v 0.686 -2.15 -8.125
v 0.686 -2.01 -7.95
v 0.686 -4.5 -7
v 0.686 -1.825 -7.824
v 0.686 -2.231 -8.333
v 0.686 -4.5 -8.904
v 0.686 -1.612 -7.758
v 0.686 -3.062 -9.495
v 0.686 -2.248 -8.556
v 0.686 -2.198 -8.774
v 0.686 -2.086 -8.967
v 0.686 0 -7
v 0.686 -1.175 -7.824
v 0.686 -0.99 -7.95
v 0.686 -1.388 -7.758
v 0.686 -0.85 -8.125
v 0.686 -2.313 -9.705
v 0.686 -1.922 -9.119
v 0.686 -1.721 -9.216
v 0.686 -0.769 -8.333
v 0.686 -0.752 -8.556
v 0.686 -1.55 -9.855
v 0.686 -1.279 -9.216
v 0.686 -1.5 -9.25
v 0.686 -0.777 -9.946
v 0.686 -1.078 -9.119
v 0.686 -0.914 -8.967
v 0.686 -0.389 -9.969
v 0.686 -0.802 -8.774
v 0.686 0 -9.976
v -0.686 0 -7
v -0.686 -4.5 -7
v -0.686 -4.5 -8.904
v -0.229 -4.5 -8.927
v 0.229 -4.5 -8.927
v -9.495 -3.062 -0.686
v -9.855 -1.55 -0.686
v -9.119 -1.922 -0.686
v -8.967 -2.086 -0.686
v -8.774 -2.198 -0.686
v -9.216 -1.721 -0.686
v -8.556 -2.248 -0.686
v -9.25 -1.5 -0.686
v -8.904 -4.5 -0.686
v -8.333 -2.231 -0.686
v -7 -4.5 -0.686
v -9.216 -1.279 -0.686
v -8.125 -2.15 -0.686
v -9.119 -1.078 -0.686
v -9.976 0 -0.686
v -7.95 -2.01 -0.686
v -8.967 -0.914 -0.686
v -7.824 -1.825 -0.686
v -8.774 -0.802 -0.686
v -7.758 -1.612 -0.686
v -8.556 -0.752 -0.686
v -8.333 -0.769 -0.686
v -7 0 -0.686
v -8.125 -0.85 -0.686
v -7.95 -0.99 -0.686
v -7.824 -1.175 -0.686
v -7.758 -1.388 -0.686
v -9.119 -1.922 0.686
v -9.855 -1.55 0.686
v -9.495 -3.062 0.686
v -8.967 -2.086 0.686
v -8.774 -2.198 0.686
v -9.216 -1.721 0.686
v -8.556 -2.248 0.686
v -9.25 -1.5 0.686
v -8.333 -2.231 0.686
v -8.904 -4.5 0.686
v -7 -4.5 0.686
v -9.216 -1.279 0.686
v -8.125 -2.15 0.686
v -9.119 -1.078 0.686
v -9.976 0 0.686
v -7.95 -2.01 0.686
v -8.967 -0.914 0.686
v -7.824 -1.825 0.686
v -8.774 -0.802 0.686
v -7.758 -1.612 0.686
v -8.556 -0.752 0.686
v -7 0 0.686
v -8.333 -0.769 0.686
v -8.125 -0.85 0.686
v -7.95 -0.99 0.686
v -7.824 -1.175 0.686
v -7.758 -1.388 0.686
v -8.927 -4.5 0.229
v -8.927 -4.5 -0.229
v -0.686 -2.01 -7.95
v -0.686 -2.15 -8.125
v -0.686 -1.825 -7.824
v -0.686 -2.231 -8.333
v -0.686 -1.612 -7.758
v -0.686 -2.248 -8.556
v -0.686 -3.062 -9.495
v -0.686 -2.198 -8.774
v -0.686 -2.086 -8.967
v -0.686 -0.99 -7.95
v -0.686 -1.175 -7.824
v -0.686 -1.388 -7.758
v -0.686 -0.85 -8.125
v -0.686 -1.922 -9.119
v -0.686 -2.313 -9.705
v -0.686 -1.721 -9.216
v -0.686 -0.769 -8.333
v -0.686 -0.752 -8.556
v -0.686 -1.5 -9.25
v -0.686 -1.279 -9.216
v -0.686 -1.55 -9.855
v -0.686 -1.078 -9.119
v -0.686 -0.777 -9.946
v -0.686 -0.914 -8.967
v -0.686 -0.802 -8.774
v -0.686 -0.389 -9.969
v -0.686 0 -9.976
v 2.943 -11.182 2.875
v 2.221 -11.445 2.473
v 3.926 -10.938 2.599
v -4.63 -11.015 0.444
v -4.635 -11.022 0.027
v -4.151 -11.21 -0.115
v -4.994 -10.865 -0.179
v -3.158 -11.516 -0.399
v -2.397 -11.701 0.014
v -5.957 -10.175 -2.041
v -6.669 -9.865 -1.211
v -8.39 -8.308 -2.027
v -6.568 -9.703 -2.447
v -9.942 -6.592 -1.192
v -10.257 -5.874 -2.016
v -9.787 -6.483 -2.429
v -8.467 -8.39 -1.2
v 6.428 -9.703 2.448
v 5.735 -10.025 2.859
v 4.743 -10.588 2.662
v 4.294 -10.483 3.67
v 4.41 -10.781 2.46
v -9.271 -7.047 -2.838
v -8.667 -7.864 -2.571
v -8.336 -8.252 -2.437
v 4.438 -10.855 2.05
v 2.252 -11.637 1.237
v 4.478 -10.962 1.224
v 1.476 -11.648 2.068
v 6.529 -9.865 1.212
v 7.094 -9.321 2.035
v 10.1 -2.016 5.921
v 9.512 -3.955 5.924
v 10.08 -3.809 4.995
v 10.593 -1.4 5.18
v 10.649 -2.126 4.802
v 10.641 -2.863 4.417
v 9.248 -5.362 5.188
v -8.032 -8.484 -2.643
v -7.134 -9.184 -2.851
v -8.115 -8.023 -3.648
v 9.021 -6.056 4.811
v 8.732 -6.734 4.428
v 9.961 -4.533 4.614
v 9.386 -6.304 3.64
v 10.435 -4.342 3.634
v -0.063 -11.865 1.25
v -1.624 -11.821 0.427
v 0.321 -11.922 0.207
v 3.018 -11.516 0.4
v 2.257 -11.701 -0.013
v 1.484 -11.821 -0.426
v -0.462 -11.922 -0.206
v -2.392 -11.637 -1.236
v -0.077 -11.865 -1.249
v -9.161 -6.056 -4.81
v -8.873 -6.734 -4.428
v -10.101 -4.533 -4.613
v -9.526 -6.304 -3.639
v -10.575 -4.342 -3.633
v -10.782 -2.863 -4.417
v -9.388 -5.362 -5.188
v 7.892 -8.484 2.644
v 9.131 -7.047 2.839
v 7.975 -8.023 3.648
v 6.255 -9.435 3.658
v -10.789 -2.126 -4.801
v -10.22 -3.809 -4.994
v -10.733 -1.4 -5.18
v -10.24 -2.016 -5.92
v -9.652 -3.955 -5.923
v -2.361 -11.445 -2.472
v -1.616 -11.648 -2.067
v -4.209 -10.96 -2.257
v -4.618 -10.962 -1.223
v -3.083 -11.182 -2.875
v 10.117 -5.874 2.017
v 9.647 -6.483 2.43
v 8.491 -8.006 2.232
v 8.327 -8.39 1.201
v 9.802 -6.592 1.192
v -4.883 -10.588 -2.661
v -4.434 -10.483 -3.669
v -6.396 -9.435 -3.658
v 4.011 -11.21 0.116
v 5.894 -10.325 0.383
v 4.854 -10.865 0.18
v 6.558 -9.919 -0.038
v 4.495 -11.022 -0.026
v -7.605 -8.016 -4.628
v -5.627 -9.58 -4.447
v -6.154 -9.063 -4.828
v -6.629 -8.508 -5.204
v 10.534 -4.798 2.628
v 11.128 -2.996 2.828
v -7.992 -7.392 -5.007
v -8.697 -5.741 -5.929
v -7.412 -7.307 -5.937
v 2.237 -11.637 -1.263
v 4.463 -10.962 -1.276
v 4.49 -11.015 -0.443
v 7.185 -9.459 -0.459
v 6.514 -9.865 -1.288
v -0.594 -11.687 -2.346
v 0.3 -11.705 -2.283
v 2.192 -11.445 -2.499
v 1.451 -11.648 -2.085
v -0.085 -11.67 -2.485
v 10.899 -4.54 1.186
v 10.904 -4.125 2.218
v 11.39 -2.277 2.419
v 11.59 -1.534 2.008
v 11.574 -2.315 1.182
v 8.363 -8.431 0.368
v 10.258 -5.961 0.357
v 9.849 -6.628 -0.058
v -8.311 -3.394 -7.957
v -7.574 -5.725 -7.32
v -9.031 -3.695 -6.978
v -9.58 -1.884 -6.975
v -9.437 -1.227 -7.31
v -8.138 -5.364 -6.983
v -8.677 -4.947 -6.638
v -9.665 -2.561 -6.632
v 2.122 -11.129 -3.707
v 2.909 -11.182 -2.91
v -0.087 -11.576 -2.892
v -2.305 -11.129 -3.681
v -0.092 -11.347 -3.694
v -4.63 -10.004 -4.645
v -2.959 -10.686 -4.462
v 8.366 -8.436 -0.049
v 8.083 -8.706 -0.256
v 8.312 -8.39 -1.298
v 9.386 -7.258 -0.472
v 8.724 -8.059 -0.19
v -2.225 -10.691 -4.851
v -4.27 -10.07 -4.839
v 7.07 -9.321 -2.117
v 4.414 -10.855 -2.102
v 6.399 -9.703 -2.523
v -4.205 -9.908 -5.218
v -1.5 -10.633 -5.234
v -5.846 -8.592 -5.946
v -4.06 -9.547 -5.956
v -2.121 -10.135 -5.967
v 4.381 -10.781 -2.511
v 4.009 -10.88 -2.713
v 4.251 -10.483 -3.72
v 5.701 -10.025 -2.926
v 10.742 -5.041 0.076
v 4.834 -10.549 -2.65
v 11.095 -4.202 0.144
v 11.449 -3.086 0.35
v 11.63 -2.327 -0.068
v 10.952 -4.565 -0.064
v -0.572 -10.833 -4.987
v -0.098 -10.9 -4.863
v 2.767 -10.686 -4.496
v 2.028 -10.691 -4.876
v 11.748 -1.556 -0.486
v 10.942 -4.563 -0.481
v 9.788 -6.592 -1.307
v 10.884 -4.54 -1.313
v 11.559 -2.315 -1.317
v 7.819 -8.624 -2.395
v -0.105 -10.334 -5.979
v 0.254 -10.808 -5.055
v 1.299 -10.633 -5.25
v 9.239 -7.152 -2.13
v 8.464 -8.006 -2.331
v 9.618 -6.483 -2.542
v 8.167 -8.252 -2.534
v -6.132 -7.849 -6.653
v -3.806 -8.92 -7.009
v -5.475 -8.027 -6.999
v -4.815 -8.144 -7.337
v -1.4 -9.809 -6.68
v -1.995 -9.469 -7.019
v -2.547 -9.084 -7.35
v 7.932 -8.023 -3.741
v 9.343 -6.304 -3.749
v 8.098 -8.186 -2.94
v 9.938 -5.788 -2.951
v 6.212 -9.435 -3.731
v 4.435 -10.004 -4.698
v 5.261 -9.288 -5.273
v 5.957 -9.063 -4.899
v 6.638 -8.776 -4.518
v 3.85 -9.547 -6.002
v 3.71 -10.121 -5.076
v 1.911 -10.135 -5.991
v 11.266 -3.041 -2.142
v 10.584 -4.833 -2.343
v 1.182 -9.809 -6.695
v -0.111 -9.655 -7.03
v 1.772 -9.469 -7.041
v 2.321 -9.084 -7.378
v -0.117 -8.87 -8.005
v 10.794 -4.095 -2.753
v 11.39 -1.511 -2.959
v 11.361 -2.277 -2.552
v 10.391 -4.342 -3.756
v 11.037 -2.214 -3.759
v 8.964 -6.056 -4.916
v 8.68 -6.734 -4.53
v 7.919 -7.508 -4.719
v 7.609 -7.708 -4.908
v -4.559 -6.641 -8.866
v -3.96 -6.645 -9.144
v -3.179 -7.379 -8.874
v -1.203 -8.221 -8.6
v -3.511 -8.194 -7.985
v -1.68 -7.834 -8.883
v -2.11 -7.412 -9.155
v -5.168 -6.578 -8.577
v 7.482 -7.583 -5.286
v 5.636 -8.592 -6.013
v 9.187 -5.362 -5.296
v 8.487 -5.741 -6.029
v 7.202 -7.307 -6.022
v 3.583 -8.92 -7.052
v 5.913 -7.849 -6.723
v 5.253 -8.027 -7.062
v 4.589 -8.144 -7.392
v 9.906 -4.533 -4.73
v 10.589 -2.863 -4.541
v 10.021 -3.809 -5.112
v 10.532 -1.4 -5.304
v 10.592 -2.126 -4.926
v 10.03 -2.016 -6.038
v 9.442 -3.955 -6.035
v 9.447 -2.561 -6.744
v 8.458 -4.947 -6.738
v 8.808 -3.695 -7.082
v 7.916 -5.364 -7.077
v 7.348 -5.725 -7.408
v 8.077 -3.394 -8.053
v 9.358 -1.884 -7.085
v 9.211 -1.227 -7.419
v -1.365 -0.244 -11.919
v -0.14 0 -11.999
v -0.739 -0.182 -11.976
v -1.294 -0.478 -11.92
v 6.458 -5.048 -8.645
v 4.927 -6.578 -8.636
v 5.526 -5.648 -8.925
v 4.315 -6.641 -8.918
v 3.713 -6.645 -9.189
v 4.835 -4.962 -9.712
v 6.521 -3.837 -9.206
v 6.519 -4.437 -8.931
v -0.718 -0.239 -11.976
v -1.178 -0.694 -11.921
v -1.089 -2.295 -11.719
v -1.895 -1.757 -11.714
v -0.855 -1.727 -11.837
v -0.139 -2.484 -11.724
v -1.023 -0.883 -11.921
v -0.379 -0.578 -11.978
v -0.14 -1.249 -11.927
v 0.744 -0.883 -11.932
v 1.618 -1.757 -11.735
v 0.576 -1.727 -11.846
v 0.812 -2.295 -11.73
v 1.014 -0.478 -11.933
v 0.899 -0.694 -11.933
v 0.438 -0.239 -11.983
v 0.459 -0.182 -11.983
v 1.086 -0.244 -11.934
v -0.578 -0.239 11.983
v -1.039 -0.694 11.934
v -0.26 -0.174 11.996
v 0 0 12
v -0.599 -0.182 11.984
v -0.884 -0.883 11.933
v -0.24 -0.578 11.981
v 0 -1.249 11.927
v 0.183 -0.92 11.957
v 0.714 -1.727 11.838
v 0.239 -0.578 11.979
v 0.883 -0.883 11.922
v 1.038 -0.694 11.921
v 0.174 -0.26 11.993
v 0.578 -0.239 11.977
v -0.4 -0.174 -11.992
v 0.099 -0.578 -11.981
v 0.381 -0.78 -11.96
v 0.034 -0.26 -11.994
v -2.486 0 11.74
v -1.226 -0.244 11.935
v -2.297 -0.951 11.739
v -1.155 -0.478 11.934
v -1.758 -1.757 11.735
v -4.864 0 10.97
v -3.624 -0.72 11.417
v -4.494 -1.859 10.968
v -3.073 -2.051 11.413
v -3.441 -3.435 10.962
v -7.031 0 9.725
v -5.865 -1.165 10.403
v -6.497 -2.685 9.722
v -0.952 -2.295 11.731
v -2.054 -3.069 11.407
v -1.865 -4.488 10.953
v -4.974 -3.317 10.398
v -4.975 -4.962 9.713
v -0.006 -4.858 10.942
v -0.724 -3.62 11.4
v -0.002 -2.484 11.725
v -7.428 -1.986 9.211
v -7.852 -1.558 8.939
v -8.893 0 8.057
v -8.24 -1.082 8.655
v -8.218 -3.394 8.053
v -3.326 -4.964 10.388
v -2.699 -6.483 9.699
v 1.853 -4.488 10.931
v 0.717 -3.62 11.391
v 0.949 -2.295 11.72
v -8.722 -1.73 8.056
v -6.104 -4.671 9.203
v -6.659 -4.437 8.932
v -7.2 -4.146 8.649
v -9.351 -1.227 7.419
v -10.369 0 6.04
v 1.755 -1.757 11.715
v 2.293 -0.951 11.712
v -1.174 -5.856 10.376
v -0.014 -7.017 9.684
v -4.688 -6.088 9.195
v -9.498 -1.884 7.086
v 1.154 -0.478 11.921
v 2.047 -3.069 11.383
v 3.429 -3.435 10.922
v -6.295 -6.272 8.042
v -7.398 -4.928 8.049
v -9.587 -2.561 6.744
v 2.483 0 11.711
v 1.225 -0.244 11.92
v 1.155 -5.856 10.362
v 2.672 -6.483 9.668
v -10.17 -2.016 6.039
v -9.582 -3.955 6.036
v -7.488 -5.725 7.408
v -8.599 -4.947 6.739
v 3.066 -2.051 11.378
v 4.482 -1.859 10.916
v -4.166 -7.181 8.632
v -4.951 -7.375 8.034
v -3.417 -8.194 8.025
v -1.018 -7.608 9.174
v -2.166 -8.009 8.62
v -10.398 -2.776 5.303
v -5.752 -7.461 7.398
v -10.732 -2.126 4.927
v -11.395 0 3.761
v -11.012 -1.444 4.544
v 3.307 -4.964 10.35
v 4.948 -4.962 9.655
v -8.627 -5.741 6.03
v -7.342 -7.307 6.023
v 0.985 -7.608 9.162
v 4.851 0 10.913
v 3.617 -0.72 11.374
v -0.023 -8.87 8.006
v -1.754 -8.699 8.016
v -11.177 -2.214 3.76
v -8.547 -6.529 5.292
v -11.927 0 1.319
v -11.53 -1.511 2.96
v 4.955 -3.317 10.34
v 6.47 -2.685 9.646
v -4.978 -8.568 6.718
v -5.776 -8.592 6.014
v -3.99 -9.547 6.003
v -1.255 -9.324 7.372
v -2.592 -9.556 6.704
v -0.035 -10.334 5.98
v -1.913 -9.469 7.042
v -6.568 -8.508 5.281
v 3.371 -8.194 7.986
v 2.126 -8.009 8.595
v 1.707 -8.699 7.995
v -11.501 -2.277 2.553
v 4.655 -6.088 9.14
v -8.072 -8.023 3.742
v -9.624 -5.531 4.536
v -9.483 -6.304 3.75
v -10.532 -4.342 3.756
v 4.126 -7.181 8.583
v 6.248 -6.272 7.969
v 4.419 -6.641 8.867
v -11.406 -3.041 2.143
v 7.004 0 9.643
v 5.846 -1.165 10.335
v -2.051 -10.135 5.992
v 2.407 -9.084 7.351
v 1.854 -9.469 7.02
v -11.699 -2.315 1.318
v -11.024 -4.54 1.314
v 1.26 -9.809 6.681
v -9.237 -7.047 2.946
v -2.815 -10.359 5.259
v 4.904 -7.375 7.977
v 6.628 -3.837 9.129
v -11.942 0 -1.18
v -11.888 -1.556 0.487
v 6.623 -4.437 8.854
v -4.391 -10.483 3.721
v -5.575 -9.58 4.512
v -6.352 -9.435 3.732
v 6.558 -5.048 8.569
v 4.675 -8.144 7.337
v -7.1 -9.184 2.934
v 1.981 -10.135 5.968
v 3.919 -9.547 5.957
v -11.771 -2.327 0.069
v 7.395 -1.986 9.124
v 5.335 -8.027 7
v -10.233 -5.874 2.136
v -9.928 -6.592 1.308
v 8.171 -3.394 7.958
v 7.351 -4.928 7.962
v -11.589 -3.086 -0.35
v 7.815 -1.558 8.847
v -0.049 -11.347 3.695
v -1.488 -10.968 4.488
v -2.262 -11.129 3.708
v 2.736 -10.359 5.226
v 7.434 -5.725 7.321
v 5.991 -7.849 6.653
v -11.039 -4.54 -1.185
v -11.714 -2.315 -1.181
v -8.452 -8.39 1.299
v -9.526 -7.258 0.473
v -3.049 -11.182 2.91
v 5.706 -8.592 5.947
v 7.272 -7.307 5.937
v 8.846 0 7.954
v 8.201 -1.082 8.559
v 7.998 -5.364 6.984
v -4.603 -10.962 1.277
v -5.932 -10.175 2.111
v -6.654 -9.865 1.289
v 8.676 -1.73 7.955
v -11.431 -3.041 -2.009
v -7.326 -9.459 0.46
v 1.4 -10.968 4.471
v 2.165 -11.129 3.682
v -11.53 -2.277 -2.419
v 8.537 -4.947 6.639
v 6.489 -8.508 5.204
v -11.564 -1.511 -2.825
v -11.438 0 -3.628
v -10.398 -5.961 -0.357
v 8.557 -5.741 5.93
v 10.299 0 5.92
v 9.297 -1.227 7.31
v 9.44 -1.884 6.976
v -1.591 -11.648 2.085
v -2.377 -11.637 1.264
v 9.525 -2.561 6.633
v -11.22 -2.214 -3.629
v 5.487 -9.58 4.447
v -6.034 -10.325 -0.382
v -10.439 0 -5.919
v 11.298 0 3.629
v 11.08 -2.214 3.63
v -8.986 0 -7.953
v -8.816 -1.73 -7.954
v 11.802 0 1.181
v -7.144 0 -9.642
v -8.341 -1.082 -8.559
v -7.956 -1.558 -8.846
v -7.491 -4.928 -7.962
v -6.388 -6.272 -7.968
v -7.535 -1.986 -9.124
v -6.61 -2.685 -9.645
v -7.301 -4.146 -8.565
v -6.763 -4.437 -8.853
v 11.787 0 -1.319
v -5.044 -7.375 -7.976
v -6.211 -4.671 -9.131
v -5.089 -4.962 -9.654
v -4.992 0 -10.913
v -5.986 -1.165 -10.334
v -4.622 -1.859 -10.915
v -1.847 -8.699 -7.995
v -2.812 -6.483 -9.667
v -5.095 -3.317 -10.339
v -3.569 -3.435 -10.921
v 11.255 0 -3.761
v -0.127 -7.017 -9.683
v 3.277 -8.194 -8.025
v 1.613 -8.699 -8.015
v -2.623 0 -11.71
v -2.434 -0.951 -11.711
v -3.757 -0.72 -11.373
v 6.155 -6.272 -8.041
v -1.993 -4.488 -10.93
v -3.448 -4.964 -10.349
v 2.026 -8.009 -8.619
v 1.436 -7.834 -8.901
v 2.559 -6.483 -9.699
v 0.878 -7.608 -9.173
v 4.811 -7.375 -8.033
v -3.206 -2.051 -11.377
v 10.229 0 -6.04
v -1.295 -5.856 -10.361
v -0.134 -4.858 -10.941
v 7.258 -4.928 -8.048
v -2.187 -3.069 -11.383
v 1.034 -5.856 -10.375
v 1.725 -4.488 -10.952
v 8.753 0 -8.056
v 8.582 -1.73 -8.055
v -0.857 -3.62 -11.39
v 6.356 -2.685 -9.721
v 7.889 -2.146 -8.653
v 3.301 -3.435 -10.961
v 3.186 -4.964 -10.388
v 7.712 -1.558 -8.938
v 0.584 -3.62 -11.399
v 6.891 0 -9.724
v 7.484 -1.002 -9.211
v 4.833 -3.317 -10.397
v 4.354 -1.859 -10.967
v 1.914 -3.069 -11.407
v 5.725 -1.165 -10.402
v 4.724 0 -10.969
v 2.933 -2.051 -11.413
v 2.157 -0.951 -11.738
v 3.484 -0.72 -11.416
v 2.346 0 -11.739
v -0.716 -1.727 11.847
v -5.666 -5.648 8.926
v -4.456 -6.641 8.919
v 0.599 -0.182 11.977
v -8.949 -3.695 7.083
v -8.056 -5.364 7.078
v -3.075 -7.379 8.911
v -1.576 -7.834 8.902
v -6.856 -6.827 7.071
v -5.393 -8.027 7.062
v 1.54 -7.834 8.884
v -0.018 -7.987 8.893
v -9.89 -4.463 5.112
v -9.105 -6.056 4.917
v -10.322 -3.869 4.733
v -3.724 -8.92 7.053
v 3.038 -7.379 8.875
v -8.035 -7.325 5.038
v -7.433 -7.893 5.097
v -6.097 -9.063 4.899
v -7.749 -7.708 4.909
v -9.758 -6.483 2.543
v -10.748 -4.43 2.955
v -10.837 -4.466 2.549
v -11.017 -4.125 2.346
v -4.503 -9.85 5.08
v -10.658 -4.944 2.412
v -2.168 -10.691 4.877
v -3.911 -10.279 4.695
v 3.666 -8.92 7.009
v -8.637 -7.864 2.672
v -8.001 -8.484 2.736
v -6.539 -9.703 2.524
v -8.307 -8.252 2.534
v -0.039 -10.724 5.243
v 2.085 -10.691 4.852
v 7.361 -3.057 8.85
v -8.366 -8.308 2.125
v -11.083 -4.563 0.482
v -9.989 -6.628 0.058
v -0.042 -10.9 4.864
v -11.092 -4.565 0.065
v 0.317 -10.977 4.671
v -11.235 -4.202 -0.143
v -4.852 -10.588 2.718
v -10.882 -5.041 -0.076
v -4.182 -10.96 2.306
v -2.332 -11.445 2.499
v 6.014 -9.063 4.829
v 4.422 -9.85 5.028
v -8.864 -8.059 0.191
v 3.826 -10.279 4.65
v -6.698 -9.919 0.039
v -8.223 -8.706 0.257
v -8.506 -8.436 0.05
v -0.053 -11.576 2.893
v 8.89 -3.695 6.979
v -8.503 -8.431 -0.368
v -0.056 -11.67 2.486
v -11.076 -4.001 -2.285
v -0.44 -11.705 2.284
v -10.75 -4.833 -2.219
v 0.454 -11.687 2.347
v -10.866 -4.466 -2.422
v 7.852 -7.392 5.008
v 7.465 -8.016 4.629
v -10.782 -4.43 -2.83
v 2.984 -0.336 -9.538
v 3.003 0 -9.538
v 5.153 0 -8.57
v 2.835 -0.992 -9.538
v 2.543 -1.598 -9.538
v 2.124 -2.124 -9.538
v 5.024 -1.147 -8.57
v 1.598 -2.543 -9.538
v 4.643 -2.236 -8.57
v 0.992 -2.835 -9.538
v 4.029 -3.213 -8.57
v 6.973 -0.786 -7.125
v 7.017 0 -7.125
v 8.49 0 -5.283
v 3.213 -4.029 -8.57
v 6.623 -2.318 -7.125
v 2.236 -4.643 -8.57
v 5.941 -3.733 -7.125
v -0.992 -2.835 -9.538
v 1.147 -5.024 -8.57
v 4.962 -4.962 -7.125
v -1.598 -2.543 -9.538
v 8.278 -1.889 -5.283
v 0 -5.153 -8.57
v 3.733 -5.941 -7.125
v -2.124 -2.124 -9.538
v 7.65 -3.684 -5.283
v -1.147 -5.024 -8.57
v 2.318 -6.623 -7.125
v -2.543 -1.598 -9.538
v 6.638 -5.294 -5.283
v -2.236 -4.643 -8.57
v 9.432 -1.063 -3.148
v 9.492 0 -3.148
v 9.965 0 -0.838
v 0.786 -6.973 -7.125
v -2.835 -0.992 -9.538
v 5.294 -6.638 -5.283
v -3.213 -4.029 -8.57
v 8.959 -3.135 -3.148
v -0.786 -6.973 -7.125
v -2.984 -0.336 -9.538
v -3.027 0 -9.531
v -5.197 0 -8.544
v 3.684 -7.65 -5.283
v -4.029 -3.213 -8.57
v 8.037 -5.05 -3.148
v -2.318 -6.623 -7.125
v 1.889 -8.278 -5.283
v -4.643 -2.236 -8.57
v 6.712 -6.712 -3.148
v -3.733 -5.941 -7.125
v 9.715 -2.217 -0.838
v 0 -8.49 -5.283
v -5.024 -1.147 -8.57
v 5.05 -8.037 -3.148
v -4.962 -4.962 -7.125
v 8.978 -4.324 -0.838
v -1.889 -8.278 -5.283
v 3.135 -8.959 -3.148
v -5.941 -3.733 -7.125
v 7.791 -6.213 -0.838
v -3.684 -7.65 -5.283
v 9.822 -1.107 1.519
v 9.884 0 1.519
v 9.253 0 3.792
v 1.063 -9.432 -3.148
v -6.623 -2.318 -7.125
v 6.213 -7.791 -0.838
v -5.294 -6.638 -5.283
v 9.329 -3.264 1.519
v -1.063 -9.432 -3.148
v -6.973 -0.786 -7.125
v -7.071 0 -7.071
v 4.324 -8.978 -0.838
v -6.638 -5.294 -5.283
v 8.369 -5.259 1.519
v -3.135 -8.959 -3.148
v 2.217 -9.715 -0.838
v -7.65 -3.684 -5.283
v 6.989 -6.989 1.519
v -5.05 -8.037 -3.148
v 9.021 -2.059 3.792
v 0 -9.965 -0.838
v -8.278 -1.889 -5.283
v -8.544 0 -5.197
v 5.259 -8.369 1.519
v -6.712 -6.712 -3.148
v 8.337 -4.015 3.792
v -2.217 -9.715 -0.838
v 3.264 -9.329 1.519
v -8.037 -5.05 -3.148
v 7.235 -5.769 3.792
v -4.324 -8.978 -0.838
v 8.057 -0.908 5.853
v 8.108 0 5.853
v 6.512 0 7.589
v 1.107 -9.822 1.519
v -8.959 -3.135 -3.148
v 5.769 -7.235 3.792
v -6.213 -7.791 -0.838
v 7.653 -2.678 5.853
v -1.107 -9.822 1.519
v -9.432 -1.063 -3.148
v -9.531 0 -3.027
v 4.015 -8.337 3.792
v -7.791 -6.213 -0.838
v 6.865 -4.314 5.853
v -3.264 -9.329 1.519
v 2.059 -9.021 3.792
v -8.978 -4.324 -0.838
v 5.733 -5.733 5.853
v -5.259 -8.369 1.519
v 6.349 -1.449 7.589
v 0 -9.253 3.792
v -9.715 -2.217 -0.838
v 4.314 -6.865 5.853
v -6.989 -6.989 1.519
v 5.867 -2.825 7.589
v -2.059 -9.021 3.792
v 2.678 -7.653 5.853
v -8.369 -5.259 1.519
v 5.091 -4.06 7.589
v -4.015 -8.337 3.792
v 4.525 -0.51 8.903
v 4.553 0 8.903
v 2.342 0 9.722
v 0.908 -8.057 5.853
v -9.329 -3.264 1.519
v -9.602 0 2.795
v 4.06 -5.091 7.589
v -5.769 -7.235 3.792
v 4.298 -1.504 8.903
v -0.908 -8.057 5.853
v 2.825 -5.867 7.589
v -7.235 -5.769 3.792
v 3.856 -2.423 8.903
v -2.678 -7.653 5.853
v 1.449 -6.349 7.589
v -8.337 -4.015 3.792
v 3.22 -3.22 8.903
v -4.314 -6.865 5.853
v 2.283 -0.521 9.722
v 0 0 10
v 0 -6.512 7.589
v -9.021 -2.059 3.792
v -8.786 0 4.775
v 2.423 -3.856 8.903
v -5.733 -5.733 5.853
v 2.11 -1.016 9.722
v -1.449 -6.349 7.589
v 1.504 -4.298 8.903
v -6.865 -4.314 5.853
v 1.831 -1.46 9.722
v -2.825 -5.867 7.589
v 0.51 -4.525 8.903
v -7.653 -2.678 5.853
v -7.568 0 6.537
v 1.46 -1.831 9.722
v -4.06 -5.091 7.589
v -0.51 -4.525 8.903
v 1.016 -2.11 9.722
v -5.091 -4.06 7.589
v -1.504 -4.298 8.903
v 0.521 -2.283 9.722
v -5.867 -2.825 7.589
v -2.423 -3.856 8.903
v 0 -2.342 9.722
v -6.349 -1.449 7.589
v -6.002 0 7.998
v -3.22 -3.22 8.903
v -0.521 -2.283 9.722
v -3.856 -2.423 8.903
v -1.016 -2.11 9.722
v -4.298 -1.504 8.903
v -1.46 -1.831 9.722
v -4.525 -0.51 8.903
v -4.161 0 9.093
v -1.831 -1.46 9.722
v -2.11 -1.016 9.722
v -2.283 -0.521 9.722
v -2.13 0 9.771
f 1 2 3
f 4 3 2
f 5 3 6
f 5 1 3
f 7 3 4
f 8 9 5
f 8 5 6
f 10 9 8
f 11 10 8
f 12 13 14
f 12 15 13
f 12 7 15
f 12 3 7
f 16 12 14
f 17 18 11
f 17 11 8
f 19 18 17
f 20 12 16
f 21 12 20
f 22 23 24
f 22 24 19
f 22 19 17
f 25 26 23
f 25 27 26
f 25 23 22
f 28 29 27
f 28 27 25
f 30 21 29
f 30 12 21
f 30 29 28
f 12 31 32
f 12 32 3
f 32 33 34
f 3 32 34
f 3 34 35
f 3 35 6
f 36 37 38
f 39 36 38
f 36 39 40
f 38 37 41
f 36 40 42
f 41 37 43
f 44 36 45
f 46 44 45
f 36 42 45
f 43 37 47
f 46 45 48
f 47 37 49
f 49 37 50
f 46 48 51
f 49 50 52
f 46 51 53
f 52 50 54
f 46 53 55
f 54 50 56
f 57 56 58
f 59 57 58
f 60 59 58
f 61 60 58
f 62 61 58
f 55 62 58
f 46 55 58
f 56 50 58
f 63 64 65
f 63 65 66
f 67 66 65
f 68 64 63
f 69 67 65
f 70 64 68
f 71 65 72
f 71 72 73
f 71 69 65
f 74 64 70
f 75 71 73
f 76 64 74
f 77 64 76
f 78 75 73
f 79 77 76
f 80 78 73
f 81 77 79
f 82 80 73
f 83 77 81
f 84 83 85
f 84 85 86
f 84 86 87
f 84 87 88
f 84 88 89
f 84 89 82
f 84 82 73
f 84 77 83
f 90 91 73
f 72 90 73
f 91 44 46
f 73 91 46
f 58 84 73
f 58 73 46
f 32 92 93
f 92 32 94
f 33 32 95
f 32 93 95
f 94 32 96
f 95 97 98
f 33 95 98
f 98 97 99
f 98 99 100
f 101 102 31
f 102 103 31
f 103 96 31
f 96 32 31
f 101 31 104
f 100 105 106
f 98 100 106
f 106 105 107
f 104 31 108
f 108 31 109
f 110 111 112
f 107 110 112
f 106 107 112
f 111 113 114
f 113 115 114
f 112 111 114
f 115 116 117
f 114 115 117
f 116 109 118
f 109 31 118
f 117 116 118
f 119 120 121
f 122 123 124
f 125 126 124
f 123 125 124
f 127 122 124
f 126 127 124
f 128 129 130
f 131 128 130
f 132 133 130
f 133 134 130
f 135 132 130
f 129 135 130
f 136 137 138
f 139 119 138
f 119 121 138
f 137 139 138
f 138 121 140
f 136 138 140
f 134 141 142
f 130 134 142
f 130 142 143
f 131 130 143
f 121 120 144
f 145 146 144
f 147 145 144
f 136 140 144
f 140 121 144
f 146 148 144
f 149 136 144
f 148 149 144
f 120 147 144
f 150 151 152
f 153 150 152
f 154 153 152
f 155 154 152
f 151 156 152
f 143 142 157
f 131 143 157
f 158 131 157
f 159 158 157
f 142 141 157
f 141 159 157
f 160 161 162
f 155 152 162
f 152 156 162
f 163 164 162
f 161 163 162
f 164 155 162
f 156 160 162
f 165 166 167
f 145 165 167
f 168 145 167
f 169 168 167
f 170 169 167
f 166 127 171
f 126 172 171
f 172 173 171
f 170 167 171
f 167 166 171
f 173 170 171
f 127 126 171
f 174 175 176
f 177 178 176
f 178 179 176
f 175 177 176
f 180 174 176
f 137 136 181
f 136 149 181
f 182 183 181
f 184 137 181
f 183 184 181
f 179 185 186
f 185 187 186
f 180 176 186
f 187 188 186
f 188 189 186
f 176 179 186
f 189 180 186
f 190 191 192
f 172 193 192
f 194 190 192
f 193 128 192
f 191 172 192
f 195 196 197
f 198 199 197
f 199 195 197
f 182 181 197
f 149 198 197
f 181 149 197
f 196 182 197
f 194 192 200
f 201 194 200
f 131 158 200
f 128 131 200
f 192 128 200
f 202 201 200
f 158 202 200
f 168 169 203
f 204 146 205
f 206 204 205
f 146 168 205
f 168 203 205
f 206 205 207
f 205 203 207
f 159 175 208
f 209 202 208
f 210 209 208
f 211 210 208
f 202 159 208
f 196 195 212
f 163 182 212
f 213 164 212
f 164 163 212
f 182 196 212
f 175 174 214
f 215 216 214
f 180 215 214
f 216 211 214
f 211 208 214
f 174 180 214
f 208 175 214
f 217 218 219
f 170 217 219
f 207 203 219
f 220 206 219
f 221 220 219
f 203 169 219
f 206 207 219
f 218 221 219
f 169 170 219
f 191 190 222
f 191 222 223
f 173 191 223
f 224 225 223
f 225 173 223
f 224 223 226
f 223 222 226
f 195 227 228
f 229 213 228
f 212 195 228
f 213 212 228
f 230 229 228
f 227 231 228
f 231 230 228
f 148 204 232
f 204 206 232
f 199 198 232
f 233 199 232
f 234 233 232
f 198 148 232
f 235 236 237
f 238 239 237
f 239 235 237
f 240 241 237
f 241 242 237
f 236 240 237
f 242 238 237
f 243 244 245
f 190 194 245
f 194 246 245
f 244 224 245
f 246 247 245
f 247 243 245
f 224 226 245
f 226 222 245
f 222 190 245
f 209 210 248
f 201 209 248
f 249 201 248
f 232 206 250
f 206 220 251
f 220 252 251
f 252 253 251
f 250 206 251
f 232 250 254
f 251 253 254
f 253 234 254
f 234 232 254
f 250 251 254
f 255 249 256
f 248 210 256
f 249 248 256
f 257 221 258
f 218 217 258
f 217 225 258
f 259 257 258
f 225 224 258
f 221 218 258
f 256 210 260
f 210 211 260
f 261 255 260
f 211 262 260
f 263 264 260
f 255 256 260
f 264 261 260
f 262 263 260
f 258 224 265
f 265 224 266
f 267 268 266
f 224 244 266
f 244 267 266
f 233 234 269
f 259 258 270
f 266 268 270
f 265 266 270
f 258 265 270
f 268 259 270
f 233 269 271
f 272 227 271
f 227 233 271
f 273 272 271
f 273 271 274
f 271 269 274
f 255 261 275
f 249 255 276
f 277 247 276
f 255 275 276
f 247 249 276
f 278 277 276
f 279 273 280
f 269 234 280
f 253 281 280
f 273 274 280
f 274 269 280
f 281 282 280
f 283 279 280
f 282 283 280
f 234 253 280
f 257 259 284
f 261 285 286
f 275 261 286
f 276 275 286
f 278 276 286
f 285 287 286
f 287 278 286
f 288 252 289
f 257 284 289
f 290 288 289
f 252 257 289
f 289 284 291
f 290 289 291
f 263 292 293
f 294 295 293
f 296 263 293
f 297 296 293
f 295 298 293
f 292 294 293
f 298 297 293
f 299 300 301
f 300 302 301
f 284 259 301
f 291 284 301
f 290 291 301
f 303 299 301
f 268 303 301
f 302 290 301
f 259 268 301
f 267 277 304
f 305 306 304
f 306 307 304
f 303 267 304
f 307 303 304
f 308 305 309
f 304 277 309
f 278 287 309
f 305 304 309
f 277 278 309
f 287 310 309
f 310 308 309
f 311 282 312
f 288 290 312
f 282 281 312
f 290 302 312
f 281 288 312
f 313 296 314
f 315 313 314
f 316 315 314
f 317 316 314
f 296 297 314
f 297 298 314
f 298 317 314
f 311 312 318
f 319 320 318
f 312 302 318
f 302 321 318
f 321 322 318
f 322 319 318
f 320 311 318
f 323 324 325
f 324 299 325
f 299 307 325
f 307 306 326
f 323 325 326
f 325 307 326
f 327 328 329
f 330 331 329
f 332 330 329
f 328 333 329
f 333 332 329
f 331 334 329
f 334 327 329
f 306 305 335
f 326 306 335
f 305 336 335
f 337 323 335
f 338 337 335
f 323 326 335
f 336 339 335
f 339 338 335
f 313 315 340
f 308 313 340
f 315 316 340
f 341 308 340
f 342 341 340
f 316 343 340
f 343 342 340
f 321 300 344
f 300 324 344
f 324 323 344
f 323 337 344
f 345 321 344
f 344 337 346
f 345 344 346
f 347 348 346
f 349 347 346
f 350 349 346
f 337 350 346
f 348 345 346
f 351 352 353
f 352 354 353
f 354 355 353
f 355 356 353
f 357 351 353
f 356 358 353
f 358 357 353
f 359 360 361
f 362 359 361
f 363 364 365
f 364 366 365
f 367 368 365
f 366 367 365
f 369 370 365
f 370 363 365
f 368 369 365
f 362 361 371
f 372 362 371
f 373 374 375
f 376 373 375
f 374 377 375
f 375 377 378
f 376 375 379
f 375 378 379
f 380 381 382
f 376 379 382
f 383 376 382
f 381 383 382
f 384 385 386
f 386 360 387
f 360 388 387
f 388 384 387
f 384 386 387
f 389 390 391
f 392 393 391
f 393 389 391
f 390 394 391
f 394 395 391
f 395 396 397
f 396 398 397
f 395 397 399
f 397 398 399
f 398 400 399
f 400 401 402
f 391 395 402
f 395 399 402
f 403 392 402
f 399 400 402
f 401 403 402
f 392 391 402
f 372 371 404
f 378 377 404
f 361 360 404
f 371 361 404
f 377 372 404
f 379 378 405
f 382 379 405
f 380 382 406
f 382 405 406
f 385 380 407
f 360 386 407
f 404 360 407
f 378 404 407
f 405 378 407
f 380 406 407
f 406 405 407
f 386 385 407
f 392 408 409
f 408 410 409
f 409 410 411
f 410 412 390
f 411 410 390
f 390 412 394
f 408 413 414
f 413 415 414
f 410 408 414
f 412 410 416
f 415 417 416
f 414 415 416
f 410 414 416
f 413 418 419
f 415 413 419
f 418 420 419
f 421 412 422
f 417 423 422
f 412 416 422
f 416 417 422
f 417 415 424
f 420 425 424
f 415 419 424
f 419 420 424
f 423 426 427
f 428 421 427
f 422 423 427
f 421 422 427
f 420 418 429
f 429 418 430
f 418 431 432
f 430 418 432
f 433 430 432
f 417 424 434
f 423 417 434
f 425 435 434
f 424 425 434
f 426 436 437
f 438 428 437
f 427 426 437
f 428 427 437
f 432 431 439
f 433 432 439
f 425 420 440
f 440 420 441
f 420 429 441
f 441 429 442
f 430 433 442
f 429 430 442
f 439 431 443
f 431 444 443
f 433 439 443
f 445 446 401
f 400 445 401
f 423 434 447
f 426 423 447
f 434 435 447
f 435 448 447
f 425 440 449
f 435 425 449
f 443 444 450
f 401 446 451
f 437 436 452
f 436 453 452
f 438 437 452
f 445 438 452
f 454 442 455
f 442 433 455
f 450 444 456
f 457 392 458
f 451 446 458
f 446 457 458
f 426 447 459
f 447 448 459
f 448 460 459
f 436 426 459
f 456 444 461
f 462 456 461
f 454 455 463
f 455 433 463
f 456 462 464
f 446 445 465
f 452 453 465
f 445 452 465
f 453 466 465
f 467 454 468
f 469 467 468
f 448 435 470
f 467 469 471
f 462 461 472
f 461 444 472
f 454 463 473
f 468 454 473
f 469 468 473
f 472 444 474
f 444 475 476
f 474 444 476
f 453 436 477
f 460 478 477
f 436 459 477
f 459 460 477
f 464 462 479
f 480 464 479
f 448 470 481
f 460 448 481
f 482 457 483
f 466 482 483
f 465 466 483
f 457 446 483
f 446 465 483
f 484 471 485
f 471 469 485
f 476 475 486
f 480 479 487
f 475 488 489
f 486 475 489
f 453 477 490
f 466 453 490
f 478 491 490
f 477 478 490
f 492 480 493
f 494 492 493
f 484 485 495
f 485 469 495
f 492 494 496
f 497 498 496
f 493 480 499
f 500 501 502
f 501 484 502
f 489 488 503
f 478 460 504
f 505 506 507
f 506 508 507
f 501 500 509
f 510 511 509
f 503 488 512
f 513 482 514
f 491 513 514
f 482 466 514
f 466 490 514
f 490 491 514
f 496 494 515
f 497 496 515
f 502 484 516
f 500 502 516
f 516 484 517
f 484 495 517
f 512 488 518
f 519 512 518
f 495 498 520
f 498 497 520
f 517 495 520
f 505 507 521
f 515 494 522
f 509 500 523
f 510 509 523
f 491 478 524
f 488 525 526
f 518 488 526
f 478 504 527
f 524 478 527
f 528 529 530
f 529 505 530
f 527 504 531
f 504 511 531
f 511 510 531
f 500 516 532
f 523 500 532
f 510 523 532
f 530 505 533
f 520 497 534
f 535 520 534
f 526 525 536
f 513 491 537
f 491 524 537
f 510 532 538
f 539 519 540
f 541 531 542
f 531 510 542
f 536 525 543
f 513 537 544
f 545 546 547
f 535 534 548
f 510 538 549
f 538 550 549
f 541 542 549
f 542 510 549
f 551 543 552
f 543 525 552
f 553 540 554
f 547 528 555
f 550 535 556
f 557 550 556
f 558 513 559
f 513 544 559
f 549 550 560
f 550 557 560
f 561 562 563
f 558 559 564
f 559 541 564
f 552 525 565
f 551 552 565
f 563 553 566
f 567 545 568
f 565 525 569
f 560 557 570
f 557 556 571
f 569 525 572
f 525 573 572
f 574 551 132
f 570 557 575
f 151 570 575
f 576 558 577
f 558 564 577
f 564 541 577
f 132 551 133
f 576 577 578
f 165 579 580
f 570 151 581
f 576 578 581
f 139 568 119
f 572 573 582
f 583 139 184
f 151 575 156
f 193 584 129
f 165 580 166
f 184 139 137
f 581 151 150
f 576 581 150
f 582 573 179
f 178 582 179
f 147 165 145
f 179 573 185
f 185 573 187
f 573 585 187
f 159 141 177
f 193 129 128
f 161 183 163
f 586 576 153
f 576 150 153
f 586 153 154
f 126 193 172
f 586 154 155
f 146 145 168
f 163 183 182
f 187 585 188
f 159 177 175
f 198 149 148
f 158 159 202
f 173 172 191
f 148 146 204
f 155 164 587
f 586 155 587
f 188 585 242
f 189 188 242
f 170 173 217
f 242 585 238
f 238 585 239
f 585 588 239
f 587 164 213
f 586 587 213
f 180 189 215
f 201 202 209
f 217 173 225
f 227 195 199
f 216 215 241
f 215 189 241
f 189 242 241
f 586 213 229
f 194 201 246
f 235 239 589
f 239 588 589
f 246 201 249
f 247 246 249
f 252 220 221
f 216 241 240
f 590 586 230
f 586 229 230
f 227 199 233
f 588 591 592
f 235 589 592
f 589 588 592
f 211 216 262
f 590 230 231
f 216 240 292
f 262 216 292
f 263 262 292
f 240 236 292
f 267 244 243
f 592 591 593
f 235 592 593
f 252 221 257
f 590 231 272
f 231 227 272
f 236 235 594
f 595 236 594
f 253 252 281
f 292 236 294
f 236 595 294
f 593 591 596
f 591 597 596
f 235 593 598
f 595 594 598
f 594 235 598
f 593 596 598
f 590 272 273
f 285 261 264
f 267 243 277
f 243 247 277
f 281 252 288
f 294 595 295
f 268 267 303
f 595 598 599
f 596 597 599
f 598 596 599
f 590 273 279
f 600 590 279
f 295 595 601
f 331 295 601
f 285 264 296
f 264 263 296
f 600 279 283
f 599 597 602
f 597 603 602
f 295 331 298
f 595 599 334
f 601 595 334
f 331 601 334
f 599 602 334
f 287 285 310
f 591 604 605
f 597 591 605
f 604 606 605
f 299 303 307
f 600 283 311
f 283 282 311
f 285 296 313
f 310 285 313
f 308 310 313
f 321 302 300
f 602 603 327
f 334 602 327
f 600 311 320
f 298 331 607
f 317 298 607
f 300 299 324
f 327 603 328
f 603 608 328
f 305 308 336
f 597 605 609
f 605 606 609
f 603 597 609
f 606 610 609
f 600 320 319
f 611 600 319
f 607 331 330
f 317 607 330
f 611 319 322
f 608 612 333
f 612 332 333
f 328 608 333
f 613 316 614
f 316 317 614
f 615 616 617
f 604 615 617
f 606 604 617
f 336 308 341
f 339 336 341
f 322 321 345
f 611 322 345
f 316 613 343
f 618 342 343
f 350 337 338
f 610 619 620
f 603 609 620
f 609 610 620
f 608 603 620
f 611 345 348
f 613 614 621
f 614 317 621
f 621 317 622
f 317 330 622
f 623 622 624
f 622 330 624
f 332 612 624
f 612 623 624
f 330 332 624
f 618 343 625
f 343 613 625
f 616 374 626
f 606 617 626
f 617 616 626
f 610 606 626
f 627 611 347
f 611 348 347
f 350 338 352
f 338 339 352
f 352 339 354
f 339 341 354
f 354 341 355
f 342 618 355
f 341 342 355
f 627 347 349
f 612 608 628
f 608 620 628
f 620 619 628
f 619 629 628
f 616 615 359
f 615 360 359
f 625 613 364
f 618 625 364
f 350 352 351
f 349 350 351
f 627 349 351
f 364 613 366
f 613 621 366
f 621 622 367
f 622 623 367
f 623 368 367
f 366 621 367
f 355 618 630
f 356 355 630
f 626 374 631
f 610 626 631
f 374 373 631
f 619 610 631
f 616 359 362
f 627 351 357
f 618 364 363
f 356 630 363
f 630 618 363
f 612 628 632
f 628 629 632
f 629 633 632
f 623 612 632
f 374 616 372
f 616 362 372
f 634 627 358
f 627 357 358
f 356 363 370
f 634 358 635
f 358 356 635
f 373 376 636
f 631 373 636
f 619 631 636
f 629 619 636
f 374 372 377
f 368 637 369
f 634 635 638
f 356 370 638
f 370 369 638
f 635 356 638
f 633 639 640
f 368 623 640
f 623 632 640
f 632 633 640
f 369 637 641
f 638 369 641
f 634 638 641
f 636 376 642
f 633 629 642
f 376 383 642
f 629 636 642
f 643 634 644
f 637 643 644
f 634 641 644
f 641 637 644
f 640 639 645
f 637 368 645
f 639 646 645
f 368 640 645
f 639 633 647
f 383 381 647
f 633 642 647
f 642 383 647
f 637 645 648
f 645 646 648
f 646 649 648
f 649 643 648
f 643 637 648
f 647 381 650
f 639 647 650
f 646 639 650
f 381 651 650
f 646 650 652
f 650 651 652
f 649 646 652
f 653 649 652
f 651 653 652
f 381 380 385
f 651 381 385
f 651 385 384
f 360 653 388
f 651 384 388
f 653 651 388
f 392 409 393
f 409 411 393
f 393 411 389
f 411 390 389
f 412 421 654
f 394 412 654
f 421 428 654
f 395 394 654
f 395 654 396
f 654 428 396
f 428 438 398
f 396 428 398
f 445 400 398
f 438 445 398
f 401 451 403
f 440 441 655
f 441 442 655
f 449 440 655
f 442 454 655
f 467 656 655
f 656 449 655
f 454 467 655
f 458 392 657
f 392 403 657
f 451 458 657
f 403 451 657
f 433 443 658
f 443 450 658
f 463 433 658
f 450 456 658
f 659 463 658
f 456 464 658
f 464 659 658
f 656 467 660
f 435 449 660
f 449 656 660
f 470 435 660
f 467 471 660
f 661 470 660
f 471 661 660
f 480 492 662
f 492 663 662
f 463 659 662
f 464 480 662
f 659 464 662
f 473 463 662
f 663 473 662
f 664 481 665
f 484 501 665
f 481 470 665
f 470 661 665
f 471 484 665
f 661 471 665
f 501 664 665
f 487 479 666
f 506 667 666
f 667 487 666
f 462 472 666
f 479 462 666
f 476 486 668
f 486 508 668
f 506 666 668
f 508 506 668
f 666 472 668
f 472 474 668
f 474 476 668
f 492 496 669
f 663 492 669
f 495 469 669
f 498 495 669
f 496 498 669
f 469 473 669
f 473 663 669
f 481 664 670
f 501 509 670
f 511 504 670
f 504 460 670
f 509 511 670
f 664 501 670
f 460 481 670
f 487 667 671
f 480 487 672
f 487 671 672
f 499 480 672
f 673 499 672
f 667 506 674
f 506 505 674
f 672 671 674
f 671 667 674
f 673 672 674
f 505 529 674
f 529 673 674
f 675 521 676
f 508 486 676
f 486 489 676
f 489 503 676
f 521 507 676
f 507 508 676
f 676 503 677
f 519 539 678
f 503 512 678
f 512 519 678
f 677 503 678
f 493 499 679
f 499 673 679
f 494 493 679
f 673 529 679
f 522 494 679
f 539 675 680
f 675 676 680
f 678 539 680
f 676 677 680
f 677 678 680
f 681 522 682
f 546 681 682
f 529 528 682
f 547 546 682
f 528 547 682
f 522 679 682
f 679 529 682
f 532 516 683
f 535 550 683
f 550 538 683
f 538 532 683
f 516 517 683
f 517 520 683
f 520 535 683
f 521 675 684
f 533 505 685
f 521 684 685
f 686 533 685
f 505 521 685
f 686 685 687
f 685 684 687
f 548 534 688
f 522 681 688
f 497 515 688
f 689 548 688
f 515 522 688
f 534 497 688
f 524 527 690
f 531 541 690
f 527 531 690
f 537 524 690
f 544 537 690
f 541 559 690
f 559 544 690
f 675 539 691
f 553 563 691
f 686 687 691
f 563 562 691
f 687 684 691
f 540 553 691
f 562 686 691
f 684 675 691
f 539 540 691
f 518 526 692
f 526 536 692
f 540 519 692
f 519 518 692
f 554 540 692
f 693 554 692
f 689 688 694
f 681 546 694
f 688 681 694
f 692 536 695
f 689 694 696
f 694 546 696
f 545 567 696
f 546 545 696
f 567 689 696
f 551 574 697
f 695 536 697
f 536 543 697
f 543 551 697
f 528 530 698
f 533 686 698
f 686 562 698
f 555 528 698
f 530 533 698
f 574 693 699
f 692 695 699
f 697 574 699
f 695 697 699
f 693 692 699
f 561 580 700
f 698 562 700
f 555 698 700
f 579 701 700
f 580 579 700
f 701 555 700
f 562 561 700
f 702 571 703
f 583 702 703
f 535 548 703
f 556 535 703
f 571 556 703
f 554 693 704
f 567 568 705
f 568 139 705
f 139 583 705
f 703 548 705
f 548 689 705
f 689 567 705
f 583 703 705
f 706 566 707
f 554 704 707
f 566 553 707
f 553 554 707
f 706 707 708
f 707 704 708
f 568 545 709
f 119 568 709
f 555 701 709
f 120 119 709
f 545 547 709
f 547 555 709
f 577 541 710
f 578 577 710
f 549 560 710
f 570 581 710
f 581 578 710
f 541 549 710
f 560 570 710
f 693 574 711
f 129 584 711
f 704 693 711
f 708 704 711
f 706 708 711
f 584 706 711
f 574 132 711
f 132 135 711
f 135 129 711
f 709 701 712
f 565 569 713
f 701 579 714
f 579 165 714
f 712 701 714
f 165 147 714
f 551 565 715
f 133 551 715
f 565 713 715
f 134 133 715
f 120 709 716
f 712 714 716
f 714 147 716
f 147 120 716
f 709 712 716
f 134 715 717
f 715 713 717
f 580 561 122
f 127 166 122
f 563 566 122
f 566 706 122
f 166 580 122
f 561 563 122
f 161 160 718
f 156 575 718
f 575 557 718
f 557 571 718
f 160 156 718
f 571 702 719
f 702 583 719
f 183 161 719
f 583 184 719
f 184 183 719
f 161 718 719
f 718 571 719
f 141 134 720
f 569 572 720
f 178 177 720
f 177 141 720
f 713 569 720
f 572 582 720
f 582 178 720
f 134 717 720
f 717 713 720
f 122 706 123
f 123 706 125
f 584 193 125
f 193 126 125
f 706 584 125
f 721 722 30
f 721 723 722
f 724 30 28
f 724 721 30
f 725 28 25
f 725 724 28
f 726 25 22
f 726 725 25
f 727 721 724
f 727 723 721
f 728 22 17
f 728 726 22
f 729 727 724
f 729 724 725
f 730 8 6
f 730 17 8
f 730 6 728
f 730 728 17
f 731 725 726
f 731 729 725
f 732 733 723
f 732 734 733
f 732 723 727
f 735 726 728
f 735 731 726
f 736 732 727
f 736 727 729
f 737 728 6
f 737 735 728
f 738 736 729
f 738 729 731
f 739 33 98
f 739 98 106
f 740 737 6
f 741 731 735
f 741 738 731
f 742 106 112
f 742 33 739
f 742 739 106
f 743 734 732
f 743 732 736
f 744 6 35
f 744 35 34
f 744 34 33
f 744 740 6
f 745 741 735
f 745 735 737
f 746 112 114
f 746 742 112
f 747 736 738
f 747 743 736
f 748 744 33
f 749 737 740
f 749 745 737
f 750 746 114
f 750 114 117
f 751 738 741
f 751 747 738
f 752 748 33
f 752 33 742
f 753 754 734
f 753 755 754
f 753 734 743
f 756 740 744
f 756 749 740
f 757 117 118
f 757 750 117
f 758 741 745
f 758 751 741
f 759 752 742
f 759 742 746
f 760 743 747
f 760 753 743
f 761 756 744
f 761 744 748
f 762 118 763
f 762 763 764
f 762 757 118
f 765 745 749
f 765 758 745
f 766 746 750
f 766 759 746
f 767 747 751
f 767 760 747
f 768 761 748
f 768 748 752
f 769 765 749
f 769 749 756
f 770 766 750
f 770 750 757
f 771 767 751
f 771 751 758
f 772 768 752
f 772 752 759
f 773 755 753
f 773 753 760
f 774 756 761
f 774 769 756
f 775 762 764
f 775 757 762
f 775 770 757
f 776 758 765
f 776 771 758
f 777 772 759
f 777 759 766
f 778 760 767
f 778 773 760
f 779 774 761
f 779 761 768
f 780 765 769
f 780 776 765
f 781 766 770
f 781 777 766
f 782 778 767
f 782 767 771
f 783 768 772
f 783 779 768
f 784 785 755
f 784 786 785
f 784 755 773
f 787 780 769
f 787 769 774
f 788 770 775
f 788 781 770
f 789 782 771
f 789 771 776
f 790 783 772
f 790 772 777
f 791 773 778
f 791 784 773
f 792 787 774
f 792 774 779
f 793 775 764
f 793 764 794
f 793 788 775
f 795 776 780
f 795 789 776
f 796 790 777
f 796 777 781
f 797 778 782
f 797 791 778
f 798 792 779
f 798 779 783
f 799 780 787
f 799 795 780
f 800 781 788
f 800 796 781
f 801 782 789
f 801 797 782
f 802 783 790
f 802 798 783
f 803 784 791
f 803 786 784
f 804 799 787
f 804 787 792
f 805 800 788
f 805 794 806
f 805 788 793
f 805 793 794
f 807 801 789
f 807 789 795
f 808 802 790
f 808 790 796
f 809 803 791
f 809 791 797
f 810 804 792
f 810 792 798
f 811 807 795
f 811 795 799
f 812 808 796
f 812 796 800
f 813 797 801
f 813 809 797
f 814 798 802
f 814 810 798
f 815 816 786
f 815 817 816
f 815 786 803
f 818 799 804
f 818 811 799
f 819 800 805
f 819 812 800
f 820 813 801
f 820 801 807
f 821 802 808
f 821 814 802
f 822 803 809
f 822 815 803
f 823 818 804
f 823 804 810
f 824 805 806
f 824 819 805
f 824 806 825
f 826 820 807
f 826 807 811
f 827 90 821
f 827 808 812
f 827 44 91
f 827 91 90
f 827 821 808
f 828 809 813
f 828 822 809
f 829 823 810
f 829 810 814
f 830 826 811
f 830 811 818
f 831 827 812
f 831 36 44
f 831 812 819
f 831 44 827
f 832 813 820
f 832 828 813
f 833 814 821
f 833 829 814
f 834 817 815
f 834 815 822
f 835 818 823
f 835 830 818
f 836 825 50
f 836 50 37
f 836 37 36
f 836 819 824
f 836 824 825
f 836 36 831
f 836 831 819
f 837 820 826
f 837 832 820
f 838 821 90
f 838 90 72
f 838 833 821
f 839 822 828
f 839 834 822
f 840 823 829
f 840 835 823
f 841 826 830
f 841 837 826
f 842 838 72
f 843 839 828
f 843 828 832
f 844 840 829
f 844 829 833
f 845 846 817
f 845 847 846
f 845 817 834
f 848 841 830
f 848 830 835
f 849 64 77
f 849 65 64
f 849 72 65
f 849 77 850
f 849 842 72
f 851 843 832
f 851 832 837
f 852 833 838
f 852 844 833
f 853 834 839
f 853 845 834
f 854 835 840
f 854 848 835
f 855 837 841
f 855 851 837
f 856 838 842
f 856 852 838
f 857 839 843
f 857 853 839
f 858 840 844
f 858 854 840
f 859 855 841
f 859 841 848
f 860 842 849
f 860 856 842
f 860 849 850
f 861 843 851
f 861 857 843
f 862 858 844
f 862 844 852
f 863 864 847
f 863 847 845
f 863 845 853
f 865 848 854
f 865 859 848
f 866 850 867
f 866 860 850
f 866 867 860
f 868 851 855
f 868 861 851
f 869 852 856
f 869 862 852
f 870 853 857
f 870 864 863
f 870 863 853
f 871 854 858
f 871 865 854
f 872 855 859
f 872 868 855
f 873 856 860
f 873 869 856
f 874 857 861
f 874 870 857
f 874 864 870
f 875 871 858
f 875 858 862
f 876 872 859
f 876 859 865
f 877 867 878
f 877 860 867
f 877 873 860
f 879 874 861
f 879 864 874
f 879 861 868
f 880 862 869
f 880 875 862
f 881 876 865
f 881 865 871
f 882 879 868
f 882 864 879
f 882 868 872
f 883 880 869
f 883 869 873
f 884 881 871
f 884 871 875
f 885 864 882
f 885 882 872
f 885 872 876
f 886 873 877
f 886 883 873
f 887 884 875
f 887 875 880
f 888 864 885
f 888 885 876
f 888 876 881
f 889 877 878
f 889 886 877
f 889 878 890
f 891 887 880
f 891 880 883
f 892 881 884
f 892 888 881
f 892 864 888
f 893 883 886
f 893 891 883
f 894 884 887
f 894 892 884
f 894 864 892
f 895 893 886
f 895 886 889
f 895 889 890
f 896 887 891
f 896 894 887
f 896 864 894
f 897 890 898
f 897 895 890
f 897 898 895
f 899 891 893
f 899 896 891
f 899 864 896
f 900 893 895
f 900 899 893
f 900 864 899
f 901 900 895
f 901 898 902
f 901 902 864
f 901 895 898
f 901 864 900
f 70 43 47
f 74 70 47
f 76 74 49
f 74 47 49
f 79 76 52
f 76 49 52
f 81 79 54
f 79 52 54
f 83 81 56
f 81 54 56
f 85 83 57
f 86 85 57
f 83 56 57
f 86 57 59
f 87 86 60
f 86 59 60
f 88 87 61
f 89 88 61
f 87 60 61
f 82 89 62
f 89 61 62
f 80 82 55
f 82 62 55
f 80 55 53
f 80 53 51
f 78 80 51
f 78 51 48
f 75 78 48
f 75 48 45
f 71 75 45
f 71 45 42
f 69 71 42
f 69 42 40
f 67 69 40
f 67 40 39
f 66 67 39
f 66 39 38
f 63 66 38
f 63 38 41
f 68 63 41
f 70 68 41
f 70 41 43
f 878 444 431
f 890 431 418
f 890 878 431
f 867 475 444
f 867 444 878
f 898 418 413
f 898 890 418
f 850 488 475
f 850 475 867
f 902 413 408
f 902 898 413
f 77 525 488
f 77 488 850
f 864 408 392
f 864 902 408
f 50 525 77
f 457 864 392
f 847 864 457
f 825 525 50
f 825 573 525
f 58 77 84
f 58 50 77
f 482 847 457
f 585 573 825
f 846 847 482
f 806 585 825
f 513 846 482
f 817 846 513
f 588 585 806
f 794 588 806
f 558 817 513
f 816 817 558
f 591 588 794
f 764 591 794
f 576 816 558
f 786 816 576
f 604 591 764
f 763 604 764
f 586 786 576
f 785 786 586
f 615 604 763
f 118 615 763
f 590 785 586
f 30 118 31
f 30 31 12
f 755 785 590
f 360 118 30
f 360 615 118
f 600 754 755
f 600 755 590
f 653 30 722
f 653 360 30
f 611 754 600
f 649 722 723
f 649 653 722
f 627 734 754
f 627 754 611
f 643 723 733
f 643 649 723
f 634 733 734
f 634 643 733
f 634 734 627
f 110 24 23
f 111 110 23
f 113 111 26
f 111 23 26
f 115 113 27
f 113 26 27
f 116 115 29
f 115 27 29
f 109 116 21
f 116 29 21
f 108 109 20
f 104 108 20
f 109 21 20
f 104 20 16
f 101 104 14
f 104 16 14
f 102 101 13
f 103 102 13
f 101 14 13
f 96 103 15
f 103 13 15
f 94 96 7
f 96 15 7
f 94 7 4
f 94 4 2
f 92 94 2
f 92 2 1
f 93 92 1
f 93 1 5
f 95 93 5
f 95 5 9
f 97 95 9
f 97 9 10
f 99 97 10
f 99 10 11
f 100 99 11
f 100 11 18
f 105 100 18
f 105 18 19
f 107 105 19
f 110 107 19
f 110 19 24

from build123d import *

# Parameters (mm, degrees)
REVOLVE1_ANGLE      = 180
SKETCH3_W           = 1.371722334
SKETCH3_H           = 4
SKETCH3_W_2         = 4
SKETCH3_H_2         = 1.371722334
BOSS_EXTRUDE1_DEPTH = 4.5
CUT_EXTRUDE1_REACH  = 23.148
SKETCH4_R           = 0.75
CUT_EXTRUDE2_REACH  = 23.148
SKETCH5_R           = 0.75


with BuildPart() as part:
    # Sketch1 → Revolve1 (revolve)
    with BuildSketch(Plane(origin=(0, 0, 0), x_dir=(1, 0, 0), z_dir=(0, 1, 0))):
        with BuildLine():
            Line((-0.14015916, 11.999181447), (0, -12))
            ThreePointArc((0, -12), (-11.99979536, -0.070080775), (-0.14015916, 11.999181447))
        make_face()
    revolve(axis=Axis((-0.14015916, 0, -11.999181447), (0.005840064605885622, 0, 0.9999829466772917)), revolution_arc=REVOLVE1_ANGLE)

    # Sketch2 → Cut-Revolve1 (revolve, cut)
    with BuildSketch(Plane(origin=(0, 0, 0), x_dir=(1, 0, 0), z_dir=(0, 1, 0))):
        with BuildLine():
            Line((0, -10), (0, 10))
            ThreePointArc((0, 10), (-10, 0), (0, -10))
        make_face()
    revolve(axis=Axis((0, 0, 10), (0, 0, -1)), mode=Mode.SUBTRACT)

    # Sketch3 → Boss-Extrude1 (add)
    with BuildSketch(Plane(origin=(0, 0, 0), x_dir=(1, 0, 0), z_dir=(0, 1, 0))):
        with Locations((0, 8.99979536)):
            Rectangle(SKETCH3_W, SKETCH3_H)
        with Locations((-8.99979536, 0)):
            Rectangle(SKETCH3_W_2, SKETCH3_H_2)
    extrude(amount=-BOSS_EXTRUDE1_DEPTH)

    # Sketch4 → Cut-Extrude1 (cut, up to next)
    with BuildSketch(Plane(origin=(0, 0, -0.685861167), x_dir=(-1, 0, 0), z_dir=(0, 0, -1)), mode=Mode.PRIVATE) as cut_extrude1_sk1:
        with Locations((8.49979536, -1.5)):
            Circle(SKETCH4_R)
    cut_extrude1_tool1 = extrude(cut_extrude1_sk1.sketch, amount=-CUT_EXTRUDE1_REACH, mode=Mode.PRIVATE) & part.part
    add(cut_extrude1_tool1.solids().sort_by_distance((-8.499795, -1.5, -0.685861))[0], mode=Mode.SUBTRACT)

    # Sketch5 → Cut-Extrude2 (cut, up to next)
    with BuildSketch(Plane(origin=(0.685861167, 0, 0), x_dir=(0, 0, -1), z_dir=(1, 0, 0)), mode=Mode.PRIVATE) as cut_extrude2_sk1:
        with Locations((8.49979536, -1.5)):
            Circle(SKETCH5_R)
    cut_extrude2_tool1 = extrude(cut_extrude2_sk1.sketch, amount=-CUT_EXTRUDE2_REACH, mode=Mode.PRIVATE) & part.part
    add(cut_extrude2_tool1.solids().sort_by_distance((0.685861, -1.5, -8.499795))[0], mode=Mode.SUBTRACT)


solid = part.part
